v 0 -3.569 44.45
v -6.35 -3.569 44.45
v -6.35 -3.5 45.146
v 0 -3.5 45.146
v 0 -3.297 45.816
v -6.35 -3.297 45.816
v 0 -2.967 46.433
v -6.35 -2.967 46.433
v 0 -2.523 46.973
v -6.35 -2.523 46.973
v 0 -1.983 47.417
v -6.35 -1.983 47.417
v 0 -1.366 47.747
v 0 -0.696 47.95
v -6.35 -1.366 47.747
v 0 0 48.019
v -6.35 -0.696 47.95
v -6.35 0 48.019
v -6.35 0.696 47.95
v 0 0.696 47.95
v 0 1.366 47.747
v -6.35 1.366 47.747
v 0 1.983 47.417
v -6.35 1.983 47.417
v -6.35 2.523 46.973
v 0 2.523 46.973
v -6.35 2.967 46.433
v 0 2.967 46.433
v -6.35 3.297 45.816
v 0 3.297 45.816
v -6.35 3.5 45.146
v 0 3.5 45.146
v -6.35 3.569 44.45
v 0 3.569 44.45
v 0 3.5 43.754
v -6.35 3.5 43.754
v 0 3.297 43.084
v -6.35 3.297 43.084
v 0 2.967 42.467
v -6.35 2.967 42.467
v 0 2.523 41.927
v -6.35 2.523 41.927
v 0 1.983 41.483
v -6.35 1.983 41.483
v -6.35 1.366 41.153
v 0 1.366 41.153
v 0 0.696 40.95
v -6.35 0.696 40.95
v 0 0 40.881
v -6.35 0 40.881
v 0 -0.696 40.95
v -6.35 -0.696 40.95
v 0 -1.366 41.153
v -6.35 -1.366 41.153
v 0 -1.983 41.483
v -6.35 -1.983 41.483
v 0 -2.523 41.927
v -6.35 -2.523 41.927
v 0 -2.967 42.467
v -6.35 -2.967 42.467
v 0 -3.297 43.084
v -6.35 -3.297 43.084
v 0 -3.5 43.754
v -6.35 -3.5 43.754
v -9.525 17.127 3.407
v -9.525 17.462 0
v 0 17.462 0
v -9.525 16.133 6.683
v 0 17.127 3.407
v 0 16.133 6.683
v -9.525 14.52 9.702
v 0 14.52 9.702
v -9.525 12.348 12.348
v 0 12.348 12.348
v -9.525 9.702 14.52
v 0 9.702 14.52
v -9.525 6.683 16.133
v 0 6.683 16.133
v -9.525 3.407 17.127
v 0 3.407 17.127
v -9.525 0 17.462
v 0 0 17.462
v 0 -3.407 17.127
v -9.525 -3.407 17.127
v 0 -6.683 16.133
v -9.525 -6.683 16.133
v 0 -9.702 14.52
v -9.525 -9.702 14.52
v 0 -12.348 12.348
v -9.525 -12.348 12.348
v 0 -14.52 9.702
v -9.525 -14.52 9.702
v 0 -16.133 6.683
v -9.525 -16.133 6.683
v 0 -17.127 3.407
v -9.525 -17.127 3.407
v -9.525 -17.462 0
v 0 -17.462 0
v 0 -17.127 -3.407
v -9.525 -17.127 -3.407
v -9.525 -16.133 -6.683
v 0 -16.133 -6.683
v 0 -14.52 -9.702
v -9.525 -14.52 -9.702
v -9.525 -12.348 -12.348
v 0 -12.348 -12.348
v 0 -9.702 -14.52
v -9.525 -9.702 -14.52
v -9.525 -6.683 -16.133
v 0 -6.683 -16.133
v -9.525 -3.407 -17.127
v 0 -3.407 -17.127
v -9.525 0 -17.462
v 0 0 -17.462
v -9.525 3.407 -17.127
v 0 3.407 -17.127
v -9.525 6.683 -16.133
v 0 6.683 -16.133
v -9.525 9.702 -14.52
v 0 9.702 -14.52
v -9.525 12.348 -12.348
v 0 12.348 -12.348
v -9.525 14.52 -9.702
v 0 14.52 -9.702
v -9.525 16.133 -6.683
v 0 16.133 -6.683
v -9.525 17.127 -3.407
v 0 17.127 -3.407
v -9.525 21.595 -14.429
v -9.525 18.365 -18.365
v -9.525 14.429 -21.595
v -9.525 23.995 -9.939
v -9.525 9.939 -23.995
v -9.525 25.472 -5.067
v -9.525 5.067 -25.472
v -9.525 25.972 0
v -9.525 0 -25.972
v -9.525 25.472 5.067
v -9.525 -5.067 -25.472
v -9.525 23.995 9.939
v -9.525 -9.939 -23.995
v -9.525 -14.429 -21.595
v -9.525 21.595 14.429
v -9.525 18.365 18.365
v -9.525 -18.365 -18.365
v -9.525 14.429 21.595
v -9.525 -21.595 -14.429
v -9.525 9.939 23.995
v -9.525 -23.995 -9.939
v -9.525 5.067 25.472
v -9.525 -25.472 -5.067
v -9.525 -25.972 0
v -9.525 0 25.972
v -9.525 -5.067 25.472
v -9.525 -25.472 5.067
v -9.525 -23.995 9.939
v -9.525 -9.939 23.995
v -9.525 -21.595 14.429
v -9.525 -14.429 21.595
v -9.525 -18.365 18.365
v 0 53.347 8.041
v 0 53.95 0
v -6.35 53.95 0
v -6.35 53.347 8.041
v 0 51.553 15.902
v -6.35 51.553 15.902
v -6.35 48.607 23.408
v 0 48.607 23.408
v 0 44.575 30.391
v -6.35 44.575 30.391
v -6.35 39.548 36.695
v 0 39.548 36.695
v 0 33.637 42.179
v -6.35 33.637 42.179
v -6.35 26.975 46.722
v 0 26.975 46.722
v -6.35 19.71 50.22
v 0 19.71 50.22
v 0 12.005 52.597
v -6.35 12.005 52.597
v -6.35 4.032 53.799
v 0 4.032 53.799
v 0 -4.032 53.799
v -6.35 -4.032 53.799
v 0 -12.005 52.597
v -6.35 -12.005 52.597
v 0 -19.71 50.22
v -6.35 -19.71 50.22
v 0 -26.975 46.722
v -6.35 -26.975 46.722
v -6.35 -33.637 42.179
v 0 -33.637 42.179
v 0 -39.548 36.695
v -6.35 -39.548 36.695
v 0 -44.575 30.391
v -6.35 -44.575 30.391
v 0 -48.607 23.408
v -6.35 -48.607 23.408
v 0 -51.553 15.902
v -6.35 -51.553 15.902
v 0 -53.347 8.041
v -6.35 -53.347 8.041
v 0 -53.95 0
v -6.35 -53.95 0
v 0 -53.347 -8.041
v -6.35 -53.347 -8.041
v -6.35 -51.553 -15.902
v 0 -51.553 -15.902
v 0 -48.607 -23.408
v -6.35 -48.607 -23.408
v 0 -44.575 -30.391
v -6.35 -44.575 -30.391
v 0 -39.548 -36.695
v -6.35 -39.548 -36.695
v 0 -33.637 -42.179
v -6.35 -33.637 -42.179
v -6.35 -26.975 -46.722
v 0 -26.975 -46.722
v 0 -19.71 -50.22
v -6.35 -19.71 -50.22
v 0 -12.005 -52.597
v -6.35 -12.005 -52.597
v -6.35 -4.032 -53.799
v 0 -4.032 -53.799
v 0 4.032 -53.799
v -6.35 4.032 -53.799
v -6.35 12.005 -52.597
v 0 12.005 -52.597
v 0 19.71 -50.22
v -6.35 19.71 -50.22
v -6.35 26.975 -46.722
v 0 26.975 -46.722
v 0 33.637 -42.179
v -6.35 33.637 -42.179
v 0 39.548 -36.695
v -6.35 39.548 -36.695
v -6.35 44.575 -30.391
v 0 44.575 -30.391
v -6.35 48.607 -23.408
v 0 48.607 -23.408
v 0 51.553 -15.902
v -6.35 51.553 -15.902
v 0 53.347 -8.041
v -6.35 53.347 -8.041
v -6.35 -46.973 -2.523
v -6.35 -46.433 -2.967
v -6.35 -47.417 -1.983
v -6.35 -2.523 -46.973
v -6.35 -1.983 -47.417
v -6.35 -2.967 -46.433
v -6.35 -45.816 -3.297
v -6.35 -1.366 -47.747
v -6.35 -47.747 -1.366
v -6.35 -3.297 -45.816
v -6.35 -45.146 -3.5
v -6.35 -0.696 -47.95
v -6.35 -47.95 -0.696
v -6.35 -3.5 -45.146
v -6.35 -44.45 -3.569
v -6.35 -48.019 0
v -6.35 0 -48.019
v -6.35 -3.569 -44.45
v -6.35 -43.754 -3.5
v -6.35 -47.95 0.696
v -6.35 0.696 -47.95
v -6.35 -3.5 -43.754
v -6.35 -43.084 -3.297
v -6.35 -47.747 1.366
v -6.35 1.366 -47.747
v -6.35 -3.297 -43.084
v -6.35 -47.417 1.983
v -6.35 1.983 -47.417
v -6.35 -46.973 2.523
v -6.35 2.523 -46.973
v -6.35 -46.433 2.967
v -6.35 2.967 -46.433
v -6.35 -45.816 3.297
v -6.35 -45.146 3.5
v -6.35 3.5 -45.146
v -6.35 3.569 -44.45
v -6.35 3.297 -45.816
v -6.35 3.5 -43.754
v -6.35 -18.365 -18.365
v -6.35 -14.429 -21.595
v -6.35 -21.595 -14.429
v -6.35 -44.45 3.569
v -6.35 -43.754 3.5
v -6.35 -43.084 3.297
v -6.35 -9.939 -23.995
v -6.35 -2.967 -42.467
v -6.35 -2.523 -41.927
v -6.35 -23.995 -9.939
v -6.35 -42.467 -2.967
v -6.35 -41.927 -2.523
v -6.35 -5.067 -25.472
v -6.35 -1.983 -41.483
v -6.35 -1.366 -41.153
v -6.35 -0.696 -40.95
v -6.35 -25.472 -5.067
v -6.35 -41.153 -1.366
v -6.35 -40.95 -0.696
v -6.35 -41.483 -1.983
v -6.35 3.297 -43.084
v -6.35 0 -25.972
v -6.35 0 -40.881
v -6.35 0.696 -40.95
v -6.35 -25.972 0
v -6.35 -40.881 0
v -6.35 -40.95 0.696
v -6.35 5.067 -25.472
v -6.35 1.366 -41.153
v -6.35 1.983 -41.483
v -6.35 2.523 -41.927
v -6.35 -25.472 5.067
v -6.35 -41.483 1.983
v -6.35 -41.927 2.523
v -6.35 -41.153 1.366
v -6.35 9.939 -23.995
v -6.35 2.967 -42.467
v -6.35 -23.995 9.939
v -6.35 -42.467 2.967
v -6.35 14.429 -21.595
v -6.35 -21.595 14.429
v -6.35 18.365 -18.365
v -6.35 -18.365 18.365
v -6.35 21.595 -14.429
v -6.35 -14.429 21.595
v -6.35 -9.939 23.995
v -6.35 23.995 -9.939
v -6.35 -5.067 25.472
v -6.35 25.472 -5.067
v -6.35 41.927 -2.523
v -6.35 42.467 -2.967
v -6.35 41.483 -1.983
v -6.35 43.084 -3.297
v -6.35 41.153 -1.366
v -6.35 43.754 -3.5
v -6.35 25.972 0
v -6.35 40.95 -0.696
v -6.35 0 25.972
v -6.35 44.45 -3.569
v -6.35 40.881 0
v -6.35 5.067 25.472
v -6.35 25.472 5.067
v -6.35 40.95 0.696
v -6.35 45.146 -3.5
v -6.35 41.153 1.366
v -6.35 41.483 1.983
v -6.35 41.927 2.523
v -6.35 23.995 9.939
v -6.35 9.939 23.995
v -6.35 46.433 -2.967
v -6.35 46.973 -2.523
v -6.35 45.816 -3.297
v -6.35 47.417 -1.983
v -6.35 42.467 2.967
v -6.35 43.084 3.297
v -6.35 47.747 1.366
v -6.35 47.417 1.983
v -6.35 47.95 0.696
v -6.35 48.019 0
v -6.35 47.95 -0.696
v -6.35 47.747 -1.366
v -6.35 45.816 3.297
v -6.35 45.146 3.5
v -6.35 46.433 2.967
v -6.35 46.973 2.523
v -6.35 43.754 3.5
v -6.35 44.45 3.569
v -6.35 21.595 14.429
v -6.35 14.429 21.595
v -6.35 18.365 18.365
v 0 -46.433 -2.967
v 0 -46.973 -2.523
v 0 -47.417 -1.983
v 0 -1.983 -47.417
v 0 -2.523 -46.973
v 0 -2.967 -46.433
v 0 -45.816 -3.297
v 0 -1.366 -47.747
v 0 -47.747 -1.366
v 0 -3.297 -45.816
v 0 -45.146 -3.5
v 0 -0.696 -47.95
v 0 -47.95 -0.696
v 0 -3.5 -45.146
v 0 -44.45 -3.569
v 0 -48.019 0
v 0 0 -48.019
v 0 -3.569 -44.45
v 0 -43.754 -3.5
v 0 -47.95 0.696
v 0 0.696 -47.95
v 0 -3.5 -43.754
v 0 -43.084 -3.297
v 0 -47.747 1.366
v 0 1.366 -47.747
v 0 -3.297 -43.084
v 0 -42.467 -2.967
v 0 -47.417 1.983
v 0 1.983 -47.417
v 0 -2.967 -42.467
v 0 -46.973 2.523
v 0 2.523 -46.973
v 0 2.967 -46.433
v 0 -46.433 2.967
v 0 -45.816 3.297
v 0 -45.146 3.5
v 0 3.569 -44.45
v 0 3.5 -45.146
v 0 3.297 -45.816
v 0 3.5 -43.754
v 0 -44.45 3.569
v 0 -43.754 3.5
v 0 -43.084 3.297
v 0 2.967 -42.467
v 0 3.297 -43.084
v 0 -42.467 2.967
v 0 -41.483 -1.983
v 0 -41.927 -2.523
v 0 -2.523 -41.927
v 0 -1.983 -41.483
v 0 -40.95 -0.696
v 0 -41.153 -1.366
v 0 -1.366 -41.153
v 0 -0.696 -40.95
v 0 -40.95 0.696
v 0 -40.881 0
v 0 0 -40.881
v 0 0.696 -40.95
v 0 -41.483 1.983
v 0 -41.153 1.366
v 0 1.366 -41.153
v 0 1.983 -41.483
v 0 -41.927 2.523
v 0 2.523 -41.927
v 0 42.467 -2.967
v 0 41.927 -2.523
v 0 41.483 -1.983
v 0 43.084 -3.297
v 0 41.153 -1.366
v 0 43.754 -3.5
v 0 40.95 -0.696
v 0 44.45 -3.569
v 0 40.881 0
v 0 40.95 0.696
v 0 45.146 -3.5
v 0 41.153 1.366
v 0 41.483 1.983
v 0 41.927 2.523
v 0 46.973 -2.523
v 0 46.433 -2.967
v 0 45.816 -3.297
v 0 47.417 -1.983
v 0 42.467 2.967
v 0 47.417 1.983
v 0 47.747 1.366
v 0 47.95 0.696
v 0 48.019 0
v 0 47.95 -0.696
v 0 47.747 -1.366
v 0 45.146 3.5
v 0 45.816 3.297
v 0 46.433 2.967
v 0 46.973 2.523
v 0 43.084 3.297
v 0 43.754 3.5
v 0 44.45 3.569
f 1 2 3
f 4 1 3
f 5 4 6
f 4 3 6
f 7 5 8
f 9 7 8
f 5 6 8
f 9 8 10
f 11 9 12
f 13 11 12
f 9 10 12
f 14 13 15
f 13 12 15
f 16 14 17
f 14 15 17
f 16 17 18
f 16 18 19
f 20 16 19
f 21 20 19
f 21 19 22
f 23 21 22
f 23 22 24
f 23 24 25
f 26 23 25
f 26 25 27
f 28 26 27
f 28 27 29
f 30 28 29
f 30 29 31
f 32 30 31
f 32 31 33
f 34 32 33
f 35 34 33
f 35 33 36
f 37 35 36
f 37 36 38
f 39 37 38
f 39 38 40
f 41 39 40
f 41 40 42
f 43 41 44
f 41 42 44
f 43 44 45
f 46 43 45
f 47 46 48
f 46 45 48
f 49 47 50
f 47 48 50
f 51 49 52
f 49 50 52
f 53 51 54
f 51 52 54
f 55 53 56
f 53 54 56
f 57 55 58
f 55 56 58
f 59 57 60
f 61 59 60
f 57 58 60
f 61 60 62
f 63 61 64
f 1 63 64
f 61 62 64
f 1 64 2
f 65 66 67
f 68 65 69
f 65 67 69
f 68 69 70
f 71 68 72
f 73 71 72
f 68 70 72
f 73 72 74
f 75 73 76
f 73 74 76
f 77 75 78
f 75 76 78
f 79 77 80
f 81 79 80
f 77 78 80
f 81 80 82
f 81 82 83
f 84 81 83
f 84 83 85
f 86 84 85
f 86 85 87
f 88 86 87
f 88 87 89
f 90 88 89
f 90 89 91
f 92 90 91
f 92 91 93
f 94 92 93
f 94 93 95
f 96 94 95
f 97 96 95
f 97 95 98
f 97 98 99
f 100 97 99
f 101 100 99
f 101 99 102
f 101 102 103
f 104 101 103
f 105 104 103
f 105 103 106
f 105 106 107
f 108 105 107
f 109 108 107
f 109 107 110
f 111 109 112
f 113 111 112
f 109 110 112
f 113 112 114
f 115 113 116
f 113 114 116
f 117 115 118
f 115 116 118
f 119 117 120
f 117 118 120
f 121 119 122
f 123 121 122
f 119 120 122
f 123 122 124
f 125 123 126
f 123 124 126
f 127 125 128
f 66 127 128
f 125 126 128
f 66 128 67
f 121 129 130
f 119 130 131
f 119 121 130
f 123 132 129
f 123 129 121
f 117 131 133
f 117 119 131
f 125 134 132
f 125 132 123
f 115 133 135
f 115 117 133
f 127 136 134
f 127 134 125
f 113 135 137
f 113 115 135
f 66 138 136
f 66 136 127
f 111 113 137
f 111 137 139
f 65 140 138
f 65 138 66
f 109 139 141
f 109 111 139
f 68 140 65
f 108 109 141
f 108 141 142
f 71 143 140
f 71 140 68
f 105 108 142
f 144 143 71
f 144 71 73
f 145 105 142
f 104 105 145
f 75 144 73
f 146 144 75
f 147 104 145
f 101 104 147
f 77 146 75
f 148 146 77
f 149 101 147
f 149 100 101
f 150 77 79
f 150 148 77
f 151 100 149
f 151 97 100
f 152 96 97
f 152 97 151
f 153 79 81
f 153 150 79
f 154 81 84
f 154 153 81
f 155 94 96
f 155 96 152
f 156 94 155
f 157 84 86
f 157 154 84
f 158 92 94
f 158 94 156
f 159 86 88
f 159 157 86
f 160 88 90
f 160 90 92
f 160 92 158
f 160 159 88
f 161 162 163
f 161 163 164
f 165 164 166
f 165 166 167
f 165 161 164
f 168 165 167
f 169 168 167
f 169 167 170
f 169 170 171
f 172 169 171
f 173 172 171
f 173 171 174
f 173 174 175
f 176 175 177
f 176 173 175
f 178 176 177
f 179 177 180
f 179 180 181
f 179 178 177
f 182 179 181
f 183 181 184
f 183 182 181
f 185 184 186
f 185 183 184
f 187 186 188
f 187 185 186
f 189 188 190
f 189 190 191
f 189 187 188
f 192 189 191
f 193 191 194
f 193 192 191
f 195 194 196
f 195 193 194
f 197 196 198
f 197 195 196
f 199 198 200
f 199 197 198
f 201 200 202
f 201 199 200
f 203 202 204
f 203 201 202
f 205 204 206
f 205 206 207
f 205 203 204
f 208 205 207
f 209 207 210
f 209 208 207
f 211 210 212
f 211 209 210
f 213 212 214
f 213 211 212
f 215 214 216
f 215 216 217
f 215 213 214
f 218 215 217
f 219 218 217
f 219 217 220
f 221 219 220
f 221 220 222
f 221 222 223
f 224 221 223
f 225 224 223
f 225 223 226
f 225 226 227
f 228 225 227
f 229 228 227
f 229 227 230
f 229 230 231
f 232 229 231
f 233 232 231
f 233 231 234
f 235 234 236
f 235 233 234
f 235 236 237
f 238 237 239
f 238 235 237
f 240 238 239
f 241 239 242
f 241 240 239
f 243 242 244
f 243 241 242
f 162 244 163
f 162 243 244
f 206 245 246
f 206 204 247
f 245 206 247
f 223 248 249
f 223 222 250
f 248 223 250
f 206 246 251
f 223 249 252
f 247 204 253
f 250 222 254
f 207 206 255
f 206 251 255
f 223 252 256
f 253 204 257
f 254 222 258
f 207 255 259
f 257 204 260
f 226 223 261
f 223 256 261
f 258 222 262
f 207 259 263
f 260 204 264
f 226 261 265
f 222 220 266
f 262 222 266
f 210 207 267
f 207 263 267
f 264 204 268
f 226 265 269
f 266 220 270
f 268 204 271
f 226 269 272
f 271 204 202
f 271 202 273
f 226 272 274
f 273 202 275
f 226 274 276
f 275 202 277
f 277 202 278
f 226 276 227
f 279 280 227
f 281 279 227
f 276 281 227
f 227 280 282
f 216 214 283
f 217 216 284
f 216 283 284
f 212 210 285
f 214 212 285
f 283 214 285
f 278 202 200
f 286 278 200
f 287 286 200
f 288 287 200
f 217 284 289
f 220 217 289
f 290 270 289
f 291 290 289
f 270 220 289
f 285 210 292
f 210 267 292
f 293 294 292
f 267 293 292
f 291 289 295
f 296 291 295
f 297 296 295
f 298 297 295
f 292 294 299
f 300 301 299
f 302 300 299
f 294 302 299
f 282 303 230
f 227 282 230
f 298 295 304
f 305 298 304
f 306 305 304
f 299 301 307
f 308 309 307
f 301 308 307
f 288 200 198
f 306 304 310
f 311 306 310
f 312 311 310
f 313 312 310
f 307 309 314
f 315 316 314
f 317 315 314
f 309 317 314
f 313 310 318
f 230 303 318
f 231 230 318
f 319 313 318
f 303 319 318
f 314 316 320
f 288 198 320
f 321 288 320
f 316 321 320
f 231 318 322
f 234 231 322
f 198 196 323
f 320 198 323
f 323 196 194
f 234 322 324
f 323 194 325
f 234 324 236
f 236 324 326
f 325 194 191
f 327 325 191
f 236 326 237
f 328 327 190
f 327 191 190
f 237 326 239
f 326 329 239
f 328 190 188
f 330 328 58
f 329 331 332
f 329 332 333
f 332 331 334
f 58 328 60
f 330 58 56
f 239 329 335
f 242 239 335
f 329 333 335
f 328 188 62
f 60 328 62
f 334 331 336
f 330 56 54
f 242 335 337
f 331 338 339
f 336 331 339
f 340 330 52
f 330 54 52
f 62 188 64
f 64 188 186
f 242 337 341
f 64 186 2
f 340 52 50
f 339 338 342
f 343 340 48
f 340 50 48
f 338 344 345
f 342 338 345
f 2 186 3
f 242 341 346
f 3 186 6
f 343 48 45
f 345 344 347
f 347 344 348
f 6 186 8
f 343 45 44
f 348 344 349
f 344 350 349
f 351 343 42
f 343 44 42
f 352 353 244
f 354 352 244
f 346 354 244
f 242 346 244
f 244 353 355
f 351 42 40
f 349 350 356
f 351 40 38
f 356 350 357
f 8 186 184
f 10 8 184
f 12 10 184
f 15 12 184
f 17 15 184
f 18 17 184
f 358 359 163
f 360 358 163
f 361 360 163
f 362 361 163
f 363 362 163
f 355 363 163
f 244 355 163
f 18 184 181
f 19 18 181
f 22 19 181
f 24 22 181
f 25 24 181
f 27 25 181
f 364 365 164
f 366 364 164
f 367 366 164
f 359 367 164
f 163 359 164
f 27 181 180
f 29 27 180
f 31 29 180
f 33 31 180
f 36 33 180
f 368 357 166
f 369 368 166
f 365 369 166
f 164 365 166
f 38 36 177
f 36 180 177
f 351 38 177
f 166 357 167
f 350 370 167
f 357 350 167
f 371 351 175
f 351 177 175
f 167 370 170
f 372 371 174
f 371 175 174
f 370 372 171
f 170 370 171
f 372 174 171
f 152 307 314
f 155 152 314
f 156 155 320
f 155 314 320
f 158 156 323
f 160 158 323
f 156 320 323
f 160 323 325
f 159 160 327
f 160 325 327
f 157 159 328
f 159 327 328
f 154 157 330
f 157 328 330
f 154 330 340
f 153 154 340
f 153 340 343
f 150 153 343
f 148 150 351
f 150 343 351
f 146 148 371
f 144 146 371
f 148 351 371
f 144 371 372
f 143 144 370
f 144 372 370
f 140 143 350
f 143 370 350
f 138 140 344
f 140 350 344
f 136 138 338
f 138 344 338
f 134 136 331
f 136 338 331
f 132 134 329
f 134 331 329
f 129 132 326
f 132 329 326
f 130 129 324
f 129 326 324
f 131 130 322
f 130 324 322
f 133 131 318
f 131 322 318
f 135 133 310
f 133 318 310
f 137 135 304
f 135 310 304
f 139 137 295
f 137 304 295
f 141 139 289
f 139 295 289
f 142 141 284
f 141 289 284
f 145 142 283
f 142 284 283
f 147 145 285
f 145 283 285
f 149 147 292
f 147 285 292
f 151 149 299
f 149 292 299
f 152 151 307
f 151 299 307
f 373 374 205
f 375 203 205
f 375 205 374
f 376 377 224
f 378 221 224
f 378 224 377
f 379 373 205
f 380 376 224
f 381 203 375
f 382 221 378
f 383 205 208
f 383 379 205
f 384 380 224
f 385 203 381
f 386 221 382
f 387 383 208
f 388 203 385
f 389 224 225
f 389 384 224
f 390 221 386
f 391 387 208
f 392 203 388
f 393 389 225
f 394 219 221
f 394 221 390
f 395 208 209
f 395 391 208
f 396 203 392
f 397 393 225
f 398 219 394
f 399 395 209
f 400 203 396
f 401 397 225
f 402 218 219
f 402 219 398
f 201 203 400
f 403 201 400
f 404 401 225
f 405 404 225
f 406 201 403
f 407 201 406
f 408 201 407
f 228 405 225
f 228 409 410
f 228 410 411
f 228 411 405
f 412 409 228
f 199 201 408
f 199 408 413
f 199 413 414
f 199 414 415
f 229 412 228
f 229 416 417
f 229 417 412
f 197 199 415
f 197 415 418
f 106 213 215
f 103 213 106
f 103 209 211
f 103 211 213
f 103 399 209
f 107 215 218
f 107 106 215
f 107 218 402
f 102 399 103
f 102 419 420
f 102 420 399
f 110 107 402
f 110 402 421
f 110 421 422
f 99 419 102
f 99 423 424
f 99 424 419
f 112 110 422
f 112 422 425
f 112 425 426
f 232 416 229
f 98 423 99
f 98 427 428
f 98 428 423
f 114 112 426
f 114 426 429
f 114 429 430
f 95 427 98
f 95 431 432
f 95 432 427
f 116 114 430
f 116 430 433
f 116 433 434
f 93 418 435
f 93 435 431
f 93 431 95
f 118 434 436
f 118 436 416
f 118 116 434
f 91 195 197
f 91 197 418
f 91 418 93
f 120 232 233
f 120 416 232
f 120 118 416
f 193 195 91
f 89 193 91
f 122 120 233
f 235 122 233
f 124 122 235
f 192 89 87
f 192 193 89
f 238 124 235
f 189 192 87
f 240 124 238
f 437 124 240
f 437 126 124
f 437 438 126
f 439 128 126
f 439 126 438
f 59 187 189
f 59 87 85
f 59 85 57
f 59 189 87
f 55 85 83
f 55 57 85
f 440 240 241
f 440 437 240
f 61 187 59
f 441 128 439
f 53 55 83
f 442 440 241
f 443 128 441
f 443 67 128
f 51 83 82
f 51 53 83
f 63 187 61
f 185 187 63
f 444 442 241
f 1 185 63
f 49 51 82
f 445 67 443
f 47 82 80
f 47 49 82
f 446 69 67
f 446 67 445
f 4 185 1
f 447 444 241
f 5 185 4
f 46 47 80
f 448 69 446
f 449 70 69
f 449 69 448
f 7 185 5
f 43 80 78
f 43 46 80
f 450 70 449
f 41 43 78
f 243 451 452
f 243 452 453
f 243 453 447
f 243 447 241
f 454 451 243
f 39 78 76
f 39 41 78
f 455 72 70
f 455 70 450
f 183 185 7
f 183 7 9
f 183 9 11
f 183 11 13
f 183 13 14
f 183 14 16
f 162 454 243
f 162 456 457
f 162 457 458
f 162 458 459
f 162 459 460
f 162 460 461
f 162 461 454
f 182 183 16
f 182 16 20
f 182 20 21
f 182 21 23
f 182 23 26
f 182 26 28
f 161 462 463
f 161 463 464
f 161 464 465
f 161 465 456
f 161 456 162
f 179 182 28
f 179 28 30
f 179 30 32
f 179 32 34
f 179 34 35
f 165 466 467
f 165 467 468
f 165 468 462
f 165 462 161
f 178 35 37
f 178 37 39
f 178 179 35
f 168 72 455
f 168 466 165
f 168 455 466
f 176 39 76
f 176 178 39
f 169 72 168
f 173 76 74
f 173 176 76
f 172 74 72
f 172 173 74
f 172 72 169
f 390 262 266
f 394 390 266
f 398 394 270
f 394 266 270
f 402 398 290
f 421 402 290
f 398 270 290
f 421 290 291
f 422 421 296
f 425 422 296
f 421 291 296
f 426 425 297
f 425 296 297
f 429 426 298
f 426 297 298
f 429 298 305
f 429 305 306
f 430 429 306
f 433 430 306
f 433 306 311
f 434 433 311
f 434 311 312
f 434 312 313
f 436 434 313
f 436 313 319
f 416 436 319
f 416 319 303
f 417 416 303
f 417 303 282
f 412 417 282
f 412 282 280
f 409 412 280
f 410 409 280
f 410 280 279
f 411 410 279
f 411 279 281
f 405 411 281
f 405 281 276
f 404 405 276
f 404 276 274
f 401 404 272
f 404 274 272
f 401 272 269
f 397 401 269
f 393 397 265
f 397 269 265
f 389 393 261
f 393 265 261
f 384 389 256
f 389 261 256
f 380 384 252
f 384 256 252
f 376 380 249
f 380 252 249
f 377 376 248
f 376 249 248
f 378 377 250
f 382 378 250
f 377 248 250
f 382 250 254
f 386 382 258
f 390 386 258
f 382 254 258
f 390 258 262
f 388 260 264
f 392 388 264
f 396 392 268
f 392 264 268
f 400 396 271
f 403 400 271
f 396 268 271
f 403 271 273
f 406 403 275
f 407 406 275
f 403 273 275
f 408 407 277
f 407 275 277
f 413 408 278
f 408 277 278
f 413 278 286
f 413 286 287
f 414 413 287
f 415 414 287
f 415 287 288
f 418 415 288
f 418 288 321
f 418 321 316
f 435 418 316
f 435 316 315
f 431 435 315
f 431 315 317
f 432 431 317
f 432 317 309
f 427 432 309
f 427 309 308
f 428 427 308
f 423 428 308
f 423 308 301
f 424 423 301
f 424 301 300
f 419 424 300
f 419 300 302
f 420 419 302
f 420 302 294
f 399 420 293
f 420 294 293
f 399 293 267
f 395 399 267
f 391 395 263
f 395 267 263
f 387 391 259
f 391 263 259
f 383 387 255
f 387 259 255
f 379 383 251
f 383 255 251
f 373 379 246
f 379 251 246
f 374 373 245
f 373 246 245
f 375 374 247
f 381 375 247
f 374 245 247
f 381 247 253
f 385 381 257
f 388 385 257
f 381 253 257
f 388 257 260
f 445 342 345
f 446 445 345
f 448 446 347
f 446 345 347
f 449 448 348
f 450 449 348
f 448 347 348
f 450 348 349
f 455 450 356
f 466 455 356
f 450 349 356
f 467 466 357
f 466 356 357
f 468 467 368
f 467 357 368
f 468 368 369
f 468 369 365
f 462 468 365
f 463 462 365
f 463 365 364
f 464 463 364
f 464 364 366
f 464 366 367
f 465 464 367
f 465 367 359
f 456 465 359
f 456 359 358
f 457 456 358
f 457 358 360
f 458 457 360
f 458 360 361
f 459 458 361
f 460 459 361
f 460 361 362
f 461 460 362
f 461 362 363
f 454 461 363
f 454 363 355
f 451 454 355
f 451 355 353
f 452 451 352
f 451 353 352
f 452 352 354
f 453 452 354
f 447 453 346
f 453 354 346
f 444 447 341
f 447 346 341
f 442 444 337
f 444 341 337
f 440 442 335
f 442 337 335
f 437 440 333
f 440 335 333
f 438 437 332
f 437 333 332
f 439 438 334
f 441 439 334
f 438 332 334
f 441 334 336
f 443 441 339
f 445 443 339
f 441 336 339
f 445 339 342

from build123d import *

# Parameters (mm, degrees)
F0_R     = 53.9496
F1_DEPTH = 6.35
F2_R     = 25.9715
F3_DEPTH = 3.175
F4_R     = 17.4625
F5_DEPTH = 9.526
F6_D     = 7.1374


with BuildPart() as f1:
    # F0 (on Right) → F1 (new body)
    with BuildSketch(Plane.YZ):
        Circle(F0_R)
    extrude(amount=-F1_DEPTH)

    # F2 (on face) → F3 (join)
    with BuildSketch(Plane(origin=(-6.35, 0, 0), x_dir=(0, -1, 0), z_dir=(-1, 0, 0))):
        Circle(F2_R)
    extrude(amount=F3_DEPTH)

    # F4 (on face) → F5 (cut, through all)
    with BuildSketch(Plane.YZ):
        Circle(F4_R)
    extrude(amount=-F5_DEPTH, mode=Mode.SUBTRACT)

    # F6 (through all)
    with Locations(Plane.YZ):
        with Locations((0, -44.45), (44.45, 0), (0, 44.45), (-44.45, 0)):
            Hole(F6_D / 2)


solid = f1.part
